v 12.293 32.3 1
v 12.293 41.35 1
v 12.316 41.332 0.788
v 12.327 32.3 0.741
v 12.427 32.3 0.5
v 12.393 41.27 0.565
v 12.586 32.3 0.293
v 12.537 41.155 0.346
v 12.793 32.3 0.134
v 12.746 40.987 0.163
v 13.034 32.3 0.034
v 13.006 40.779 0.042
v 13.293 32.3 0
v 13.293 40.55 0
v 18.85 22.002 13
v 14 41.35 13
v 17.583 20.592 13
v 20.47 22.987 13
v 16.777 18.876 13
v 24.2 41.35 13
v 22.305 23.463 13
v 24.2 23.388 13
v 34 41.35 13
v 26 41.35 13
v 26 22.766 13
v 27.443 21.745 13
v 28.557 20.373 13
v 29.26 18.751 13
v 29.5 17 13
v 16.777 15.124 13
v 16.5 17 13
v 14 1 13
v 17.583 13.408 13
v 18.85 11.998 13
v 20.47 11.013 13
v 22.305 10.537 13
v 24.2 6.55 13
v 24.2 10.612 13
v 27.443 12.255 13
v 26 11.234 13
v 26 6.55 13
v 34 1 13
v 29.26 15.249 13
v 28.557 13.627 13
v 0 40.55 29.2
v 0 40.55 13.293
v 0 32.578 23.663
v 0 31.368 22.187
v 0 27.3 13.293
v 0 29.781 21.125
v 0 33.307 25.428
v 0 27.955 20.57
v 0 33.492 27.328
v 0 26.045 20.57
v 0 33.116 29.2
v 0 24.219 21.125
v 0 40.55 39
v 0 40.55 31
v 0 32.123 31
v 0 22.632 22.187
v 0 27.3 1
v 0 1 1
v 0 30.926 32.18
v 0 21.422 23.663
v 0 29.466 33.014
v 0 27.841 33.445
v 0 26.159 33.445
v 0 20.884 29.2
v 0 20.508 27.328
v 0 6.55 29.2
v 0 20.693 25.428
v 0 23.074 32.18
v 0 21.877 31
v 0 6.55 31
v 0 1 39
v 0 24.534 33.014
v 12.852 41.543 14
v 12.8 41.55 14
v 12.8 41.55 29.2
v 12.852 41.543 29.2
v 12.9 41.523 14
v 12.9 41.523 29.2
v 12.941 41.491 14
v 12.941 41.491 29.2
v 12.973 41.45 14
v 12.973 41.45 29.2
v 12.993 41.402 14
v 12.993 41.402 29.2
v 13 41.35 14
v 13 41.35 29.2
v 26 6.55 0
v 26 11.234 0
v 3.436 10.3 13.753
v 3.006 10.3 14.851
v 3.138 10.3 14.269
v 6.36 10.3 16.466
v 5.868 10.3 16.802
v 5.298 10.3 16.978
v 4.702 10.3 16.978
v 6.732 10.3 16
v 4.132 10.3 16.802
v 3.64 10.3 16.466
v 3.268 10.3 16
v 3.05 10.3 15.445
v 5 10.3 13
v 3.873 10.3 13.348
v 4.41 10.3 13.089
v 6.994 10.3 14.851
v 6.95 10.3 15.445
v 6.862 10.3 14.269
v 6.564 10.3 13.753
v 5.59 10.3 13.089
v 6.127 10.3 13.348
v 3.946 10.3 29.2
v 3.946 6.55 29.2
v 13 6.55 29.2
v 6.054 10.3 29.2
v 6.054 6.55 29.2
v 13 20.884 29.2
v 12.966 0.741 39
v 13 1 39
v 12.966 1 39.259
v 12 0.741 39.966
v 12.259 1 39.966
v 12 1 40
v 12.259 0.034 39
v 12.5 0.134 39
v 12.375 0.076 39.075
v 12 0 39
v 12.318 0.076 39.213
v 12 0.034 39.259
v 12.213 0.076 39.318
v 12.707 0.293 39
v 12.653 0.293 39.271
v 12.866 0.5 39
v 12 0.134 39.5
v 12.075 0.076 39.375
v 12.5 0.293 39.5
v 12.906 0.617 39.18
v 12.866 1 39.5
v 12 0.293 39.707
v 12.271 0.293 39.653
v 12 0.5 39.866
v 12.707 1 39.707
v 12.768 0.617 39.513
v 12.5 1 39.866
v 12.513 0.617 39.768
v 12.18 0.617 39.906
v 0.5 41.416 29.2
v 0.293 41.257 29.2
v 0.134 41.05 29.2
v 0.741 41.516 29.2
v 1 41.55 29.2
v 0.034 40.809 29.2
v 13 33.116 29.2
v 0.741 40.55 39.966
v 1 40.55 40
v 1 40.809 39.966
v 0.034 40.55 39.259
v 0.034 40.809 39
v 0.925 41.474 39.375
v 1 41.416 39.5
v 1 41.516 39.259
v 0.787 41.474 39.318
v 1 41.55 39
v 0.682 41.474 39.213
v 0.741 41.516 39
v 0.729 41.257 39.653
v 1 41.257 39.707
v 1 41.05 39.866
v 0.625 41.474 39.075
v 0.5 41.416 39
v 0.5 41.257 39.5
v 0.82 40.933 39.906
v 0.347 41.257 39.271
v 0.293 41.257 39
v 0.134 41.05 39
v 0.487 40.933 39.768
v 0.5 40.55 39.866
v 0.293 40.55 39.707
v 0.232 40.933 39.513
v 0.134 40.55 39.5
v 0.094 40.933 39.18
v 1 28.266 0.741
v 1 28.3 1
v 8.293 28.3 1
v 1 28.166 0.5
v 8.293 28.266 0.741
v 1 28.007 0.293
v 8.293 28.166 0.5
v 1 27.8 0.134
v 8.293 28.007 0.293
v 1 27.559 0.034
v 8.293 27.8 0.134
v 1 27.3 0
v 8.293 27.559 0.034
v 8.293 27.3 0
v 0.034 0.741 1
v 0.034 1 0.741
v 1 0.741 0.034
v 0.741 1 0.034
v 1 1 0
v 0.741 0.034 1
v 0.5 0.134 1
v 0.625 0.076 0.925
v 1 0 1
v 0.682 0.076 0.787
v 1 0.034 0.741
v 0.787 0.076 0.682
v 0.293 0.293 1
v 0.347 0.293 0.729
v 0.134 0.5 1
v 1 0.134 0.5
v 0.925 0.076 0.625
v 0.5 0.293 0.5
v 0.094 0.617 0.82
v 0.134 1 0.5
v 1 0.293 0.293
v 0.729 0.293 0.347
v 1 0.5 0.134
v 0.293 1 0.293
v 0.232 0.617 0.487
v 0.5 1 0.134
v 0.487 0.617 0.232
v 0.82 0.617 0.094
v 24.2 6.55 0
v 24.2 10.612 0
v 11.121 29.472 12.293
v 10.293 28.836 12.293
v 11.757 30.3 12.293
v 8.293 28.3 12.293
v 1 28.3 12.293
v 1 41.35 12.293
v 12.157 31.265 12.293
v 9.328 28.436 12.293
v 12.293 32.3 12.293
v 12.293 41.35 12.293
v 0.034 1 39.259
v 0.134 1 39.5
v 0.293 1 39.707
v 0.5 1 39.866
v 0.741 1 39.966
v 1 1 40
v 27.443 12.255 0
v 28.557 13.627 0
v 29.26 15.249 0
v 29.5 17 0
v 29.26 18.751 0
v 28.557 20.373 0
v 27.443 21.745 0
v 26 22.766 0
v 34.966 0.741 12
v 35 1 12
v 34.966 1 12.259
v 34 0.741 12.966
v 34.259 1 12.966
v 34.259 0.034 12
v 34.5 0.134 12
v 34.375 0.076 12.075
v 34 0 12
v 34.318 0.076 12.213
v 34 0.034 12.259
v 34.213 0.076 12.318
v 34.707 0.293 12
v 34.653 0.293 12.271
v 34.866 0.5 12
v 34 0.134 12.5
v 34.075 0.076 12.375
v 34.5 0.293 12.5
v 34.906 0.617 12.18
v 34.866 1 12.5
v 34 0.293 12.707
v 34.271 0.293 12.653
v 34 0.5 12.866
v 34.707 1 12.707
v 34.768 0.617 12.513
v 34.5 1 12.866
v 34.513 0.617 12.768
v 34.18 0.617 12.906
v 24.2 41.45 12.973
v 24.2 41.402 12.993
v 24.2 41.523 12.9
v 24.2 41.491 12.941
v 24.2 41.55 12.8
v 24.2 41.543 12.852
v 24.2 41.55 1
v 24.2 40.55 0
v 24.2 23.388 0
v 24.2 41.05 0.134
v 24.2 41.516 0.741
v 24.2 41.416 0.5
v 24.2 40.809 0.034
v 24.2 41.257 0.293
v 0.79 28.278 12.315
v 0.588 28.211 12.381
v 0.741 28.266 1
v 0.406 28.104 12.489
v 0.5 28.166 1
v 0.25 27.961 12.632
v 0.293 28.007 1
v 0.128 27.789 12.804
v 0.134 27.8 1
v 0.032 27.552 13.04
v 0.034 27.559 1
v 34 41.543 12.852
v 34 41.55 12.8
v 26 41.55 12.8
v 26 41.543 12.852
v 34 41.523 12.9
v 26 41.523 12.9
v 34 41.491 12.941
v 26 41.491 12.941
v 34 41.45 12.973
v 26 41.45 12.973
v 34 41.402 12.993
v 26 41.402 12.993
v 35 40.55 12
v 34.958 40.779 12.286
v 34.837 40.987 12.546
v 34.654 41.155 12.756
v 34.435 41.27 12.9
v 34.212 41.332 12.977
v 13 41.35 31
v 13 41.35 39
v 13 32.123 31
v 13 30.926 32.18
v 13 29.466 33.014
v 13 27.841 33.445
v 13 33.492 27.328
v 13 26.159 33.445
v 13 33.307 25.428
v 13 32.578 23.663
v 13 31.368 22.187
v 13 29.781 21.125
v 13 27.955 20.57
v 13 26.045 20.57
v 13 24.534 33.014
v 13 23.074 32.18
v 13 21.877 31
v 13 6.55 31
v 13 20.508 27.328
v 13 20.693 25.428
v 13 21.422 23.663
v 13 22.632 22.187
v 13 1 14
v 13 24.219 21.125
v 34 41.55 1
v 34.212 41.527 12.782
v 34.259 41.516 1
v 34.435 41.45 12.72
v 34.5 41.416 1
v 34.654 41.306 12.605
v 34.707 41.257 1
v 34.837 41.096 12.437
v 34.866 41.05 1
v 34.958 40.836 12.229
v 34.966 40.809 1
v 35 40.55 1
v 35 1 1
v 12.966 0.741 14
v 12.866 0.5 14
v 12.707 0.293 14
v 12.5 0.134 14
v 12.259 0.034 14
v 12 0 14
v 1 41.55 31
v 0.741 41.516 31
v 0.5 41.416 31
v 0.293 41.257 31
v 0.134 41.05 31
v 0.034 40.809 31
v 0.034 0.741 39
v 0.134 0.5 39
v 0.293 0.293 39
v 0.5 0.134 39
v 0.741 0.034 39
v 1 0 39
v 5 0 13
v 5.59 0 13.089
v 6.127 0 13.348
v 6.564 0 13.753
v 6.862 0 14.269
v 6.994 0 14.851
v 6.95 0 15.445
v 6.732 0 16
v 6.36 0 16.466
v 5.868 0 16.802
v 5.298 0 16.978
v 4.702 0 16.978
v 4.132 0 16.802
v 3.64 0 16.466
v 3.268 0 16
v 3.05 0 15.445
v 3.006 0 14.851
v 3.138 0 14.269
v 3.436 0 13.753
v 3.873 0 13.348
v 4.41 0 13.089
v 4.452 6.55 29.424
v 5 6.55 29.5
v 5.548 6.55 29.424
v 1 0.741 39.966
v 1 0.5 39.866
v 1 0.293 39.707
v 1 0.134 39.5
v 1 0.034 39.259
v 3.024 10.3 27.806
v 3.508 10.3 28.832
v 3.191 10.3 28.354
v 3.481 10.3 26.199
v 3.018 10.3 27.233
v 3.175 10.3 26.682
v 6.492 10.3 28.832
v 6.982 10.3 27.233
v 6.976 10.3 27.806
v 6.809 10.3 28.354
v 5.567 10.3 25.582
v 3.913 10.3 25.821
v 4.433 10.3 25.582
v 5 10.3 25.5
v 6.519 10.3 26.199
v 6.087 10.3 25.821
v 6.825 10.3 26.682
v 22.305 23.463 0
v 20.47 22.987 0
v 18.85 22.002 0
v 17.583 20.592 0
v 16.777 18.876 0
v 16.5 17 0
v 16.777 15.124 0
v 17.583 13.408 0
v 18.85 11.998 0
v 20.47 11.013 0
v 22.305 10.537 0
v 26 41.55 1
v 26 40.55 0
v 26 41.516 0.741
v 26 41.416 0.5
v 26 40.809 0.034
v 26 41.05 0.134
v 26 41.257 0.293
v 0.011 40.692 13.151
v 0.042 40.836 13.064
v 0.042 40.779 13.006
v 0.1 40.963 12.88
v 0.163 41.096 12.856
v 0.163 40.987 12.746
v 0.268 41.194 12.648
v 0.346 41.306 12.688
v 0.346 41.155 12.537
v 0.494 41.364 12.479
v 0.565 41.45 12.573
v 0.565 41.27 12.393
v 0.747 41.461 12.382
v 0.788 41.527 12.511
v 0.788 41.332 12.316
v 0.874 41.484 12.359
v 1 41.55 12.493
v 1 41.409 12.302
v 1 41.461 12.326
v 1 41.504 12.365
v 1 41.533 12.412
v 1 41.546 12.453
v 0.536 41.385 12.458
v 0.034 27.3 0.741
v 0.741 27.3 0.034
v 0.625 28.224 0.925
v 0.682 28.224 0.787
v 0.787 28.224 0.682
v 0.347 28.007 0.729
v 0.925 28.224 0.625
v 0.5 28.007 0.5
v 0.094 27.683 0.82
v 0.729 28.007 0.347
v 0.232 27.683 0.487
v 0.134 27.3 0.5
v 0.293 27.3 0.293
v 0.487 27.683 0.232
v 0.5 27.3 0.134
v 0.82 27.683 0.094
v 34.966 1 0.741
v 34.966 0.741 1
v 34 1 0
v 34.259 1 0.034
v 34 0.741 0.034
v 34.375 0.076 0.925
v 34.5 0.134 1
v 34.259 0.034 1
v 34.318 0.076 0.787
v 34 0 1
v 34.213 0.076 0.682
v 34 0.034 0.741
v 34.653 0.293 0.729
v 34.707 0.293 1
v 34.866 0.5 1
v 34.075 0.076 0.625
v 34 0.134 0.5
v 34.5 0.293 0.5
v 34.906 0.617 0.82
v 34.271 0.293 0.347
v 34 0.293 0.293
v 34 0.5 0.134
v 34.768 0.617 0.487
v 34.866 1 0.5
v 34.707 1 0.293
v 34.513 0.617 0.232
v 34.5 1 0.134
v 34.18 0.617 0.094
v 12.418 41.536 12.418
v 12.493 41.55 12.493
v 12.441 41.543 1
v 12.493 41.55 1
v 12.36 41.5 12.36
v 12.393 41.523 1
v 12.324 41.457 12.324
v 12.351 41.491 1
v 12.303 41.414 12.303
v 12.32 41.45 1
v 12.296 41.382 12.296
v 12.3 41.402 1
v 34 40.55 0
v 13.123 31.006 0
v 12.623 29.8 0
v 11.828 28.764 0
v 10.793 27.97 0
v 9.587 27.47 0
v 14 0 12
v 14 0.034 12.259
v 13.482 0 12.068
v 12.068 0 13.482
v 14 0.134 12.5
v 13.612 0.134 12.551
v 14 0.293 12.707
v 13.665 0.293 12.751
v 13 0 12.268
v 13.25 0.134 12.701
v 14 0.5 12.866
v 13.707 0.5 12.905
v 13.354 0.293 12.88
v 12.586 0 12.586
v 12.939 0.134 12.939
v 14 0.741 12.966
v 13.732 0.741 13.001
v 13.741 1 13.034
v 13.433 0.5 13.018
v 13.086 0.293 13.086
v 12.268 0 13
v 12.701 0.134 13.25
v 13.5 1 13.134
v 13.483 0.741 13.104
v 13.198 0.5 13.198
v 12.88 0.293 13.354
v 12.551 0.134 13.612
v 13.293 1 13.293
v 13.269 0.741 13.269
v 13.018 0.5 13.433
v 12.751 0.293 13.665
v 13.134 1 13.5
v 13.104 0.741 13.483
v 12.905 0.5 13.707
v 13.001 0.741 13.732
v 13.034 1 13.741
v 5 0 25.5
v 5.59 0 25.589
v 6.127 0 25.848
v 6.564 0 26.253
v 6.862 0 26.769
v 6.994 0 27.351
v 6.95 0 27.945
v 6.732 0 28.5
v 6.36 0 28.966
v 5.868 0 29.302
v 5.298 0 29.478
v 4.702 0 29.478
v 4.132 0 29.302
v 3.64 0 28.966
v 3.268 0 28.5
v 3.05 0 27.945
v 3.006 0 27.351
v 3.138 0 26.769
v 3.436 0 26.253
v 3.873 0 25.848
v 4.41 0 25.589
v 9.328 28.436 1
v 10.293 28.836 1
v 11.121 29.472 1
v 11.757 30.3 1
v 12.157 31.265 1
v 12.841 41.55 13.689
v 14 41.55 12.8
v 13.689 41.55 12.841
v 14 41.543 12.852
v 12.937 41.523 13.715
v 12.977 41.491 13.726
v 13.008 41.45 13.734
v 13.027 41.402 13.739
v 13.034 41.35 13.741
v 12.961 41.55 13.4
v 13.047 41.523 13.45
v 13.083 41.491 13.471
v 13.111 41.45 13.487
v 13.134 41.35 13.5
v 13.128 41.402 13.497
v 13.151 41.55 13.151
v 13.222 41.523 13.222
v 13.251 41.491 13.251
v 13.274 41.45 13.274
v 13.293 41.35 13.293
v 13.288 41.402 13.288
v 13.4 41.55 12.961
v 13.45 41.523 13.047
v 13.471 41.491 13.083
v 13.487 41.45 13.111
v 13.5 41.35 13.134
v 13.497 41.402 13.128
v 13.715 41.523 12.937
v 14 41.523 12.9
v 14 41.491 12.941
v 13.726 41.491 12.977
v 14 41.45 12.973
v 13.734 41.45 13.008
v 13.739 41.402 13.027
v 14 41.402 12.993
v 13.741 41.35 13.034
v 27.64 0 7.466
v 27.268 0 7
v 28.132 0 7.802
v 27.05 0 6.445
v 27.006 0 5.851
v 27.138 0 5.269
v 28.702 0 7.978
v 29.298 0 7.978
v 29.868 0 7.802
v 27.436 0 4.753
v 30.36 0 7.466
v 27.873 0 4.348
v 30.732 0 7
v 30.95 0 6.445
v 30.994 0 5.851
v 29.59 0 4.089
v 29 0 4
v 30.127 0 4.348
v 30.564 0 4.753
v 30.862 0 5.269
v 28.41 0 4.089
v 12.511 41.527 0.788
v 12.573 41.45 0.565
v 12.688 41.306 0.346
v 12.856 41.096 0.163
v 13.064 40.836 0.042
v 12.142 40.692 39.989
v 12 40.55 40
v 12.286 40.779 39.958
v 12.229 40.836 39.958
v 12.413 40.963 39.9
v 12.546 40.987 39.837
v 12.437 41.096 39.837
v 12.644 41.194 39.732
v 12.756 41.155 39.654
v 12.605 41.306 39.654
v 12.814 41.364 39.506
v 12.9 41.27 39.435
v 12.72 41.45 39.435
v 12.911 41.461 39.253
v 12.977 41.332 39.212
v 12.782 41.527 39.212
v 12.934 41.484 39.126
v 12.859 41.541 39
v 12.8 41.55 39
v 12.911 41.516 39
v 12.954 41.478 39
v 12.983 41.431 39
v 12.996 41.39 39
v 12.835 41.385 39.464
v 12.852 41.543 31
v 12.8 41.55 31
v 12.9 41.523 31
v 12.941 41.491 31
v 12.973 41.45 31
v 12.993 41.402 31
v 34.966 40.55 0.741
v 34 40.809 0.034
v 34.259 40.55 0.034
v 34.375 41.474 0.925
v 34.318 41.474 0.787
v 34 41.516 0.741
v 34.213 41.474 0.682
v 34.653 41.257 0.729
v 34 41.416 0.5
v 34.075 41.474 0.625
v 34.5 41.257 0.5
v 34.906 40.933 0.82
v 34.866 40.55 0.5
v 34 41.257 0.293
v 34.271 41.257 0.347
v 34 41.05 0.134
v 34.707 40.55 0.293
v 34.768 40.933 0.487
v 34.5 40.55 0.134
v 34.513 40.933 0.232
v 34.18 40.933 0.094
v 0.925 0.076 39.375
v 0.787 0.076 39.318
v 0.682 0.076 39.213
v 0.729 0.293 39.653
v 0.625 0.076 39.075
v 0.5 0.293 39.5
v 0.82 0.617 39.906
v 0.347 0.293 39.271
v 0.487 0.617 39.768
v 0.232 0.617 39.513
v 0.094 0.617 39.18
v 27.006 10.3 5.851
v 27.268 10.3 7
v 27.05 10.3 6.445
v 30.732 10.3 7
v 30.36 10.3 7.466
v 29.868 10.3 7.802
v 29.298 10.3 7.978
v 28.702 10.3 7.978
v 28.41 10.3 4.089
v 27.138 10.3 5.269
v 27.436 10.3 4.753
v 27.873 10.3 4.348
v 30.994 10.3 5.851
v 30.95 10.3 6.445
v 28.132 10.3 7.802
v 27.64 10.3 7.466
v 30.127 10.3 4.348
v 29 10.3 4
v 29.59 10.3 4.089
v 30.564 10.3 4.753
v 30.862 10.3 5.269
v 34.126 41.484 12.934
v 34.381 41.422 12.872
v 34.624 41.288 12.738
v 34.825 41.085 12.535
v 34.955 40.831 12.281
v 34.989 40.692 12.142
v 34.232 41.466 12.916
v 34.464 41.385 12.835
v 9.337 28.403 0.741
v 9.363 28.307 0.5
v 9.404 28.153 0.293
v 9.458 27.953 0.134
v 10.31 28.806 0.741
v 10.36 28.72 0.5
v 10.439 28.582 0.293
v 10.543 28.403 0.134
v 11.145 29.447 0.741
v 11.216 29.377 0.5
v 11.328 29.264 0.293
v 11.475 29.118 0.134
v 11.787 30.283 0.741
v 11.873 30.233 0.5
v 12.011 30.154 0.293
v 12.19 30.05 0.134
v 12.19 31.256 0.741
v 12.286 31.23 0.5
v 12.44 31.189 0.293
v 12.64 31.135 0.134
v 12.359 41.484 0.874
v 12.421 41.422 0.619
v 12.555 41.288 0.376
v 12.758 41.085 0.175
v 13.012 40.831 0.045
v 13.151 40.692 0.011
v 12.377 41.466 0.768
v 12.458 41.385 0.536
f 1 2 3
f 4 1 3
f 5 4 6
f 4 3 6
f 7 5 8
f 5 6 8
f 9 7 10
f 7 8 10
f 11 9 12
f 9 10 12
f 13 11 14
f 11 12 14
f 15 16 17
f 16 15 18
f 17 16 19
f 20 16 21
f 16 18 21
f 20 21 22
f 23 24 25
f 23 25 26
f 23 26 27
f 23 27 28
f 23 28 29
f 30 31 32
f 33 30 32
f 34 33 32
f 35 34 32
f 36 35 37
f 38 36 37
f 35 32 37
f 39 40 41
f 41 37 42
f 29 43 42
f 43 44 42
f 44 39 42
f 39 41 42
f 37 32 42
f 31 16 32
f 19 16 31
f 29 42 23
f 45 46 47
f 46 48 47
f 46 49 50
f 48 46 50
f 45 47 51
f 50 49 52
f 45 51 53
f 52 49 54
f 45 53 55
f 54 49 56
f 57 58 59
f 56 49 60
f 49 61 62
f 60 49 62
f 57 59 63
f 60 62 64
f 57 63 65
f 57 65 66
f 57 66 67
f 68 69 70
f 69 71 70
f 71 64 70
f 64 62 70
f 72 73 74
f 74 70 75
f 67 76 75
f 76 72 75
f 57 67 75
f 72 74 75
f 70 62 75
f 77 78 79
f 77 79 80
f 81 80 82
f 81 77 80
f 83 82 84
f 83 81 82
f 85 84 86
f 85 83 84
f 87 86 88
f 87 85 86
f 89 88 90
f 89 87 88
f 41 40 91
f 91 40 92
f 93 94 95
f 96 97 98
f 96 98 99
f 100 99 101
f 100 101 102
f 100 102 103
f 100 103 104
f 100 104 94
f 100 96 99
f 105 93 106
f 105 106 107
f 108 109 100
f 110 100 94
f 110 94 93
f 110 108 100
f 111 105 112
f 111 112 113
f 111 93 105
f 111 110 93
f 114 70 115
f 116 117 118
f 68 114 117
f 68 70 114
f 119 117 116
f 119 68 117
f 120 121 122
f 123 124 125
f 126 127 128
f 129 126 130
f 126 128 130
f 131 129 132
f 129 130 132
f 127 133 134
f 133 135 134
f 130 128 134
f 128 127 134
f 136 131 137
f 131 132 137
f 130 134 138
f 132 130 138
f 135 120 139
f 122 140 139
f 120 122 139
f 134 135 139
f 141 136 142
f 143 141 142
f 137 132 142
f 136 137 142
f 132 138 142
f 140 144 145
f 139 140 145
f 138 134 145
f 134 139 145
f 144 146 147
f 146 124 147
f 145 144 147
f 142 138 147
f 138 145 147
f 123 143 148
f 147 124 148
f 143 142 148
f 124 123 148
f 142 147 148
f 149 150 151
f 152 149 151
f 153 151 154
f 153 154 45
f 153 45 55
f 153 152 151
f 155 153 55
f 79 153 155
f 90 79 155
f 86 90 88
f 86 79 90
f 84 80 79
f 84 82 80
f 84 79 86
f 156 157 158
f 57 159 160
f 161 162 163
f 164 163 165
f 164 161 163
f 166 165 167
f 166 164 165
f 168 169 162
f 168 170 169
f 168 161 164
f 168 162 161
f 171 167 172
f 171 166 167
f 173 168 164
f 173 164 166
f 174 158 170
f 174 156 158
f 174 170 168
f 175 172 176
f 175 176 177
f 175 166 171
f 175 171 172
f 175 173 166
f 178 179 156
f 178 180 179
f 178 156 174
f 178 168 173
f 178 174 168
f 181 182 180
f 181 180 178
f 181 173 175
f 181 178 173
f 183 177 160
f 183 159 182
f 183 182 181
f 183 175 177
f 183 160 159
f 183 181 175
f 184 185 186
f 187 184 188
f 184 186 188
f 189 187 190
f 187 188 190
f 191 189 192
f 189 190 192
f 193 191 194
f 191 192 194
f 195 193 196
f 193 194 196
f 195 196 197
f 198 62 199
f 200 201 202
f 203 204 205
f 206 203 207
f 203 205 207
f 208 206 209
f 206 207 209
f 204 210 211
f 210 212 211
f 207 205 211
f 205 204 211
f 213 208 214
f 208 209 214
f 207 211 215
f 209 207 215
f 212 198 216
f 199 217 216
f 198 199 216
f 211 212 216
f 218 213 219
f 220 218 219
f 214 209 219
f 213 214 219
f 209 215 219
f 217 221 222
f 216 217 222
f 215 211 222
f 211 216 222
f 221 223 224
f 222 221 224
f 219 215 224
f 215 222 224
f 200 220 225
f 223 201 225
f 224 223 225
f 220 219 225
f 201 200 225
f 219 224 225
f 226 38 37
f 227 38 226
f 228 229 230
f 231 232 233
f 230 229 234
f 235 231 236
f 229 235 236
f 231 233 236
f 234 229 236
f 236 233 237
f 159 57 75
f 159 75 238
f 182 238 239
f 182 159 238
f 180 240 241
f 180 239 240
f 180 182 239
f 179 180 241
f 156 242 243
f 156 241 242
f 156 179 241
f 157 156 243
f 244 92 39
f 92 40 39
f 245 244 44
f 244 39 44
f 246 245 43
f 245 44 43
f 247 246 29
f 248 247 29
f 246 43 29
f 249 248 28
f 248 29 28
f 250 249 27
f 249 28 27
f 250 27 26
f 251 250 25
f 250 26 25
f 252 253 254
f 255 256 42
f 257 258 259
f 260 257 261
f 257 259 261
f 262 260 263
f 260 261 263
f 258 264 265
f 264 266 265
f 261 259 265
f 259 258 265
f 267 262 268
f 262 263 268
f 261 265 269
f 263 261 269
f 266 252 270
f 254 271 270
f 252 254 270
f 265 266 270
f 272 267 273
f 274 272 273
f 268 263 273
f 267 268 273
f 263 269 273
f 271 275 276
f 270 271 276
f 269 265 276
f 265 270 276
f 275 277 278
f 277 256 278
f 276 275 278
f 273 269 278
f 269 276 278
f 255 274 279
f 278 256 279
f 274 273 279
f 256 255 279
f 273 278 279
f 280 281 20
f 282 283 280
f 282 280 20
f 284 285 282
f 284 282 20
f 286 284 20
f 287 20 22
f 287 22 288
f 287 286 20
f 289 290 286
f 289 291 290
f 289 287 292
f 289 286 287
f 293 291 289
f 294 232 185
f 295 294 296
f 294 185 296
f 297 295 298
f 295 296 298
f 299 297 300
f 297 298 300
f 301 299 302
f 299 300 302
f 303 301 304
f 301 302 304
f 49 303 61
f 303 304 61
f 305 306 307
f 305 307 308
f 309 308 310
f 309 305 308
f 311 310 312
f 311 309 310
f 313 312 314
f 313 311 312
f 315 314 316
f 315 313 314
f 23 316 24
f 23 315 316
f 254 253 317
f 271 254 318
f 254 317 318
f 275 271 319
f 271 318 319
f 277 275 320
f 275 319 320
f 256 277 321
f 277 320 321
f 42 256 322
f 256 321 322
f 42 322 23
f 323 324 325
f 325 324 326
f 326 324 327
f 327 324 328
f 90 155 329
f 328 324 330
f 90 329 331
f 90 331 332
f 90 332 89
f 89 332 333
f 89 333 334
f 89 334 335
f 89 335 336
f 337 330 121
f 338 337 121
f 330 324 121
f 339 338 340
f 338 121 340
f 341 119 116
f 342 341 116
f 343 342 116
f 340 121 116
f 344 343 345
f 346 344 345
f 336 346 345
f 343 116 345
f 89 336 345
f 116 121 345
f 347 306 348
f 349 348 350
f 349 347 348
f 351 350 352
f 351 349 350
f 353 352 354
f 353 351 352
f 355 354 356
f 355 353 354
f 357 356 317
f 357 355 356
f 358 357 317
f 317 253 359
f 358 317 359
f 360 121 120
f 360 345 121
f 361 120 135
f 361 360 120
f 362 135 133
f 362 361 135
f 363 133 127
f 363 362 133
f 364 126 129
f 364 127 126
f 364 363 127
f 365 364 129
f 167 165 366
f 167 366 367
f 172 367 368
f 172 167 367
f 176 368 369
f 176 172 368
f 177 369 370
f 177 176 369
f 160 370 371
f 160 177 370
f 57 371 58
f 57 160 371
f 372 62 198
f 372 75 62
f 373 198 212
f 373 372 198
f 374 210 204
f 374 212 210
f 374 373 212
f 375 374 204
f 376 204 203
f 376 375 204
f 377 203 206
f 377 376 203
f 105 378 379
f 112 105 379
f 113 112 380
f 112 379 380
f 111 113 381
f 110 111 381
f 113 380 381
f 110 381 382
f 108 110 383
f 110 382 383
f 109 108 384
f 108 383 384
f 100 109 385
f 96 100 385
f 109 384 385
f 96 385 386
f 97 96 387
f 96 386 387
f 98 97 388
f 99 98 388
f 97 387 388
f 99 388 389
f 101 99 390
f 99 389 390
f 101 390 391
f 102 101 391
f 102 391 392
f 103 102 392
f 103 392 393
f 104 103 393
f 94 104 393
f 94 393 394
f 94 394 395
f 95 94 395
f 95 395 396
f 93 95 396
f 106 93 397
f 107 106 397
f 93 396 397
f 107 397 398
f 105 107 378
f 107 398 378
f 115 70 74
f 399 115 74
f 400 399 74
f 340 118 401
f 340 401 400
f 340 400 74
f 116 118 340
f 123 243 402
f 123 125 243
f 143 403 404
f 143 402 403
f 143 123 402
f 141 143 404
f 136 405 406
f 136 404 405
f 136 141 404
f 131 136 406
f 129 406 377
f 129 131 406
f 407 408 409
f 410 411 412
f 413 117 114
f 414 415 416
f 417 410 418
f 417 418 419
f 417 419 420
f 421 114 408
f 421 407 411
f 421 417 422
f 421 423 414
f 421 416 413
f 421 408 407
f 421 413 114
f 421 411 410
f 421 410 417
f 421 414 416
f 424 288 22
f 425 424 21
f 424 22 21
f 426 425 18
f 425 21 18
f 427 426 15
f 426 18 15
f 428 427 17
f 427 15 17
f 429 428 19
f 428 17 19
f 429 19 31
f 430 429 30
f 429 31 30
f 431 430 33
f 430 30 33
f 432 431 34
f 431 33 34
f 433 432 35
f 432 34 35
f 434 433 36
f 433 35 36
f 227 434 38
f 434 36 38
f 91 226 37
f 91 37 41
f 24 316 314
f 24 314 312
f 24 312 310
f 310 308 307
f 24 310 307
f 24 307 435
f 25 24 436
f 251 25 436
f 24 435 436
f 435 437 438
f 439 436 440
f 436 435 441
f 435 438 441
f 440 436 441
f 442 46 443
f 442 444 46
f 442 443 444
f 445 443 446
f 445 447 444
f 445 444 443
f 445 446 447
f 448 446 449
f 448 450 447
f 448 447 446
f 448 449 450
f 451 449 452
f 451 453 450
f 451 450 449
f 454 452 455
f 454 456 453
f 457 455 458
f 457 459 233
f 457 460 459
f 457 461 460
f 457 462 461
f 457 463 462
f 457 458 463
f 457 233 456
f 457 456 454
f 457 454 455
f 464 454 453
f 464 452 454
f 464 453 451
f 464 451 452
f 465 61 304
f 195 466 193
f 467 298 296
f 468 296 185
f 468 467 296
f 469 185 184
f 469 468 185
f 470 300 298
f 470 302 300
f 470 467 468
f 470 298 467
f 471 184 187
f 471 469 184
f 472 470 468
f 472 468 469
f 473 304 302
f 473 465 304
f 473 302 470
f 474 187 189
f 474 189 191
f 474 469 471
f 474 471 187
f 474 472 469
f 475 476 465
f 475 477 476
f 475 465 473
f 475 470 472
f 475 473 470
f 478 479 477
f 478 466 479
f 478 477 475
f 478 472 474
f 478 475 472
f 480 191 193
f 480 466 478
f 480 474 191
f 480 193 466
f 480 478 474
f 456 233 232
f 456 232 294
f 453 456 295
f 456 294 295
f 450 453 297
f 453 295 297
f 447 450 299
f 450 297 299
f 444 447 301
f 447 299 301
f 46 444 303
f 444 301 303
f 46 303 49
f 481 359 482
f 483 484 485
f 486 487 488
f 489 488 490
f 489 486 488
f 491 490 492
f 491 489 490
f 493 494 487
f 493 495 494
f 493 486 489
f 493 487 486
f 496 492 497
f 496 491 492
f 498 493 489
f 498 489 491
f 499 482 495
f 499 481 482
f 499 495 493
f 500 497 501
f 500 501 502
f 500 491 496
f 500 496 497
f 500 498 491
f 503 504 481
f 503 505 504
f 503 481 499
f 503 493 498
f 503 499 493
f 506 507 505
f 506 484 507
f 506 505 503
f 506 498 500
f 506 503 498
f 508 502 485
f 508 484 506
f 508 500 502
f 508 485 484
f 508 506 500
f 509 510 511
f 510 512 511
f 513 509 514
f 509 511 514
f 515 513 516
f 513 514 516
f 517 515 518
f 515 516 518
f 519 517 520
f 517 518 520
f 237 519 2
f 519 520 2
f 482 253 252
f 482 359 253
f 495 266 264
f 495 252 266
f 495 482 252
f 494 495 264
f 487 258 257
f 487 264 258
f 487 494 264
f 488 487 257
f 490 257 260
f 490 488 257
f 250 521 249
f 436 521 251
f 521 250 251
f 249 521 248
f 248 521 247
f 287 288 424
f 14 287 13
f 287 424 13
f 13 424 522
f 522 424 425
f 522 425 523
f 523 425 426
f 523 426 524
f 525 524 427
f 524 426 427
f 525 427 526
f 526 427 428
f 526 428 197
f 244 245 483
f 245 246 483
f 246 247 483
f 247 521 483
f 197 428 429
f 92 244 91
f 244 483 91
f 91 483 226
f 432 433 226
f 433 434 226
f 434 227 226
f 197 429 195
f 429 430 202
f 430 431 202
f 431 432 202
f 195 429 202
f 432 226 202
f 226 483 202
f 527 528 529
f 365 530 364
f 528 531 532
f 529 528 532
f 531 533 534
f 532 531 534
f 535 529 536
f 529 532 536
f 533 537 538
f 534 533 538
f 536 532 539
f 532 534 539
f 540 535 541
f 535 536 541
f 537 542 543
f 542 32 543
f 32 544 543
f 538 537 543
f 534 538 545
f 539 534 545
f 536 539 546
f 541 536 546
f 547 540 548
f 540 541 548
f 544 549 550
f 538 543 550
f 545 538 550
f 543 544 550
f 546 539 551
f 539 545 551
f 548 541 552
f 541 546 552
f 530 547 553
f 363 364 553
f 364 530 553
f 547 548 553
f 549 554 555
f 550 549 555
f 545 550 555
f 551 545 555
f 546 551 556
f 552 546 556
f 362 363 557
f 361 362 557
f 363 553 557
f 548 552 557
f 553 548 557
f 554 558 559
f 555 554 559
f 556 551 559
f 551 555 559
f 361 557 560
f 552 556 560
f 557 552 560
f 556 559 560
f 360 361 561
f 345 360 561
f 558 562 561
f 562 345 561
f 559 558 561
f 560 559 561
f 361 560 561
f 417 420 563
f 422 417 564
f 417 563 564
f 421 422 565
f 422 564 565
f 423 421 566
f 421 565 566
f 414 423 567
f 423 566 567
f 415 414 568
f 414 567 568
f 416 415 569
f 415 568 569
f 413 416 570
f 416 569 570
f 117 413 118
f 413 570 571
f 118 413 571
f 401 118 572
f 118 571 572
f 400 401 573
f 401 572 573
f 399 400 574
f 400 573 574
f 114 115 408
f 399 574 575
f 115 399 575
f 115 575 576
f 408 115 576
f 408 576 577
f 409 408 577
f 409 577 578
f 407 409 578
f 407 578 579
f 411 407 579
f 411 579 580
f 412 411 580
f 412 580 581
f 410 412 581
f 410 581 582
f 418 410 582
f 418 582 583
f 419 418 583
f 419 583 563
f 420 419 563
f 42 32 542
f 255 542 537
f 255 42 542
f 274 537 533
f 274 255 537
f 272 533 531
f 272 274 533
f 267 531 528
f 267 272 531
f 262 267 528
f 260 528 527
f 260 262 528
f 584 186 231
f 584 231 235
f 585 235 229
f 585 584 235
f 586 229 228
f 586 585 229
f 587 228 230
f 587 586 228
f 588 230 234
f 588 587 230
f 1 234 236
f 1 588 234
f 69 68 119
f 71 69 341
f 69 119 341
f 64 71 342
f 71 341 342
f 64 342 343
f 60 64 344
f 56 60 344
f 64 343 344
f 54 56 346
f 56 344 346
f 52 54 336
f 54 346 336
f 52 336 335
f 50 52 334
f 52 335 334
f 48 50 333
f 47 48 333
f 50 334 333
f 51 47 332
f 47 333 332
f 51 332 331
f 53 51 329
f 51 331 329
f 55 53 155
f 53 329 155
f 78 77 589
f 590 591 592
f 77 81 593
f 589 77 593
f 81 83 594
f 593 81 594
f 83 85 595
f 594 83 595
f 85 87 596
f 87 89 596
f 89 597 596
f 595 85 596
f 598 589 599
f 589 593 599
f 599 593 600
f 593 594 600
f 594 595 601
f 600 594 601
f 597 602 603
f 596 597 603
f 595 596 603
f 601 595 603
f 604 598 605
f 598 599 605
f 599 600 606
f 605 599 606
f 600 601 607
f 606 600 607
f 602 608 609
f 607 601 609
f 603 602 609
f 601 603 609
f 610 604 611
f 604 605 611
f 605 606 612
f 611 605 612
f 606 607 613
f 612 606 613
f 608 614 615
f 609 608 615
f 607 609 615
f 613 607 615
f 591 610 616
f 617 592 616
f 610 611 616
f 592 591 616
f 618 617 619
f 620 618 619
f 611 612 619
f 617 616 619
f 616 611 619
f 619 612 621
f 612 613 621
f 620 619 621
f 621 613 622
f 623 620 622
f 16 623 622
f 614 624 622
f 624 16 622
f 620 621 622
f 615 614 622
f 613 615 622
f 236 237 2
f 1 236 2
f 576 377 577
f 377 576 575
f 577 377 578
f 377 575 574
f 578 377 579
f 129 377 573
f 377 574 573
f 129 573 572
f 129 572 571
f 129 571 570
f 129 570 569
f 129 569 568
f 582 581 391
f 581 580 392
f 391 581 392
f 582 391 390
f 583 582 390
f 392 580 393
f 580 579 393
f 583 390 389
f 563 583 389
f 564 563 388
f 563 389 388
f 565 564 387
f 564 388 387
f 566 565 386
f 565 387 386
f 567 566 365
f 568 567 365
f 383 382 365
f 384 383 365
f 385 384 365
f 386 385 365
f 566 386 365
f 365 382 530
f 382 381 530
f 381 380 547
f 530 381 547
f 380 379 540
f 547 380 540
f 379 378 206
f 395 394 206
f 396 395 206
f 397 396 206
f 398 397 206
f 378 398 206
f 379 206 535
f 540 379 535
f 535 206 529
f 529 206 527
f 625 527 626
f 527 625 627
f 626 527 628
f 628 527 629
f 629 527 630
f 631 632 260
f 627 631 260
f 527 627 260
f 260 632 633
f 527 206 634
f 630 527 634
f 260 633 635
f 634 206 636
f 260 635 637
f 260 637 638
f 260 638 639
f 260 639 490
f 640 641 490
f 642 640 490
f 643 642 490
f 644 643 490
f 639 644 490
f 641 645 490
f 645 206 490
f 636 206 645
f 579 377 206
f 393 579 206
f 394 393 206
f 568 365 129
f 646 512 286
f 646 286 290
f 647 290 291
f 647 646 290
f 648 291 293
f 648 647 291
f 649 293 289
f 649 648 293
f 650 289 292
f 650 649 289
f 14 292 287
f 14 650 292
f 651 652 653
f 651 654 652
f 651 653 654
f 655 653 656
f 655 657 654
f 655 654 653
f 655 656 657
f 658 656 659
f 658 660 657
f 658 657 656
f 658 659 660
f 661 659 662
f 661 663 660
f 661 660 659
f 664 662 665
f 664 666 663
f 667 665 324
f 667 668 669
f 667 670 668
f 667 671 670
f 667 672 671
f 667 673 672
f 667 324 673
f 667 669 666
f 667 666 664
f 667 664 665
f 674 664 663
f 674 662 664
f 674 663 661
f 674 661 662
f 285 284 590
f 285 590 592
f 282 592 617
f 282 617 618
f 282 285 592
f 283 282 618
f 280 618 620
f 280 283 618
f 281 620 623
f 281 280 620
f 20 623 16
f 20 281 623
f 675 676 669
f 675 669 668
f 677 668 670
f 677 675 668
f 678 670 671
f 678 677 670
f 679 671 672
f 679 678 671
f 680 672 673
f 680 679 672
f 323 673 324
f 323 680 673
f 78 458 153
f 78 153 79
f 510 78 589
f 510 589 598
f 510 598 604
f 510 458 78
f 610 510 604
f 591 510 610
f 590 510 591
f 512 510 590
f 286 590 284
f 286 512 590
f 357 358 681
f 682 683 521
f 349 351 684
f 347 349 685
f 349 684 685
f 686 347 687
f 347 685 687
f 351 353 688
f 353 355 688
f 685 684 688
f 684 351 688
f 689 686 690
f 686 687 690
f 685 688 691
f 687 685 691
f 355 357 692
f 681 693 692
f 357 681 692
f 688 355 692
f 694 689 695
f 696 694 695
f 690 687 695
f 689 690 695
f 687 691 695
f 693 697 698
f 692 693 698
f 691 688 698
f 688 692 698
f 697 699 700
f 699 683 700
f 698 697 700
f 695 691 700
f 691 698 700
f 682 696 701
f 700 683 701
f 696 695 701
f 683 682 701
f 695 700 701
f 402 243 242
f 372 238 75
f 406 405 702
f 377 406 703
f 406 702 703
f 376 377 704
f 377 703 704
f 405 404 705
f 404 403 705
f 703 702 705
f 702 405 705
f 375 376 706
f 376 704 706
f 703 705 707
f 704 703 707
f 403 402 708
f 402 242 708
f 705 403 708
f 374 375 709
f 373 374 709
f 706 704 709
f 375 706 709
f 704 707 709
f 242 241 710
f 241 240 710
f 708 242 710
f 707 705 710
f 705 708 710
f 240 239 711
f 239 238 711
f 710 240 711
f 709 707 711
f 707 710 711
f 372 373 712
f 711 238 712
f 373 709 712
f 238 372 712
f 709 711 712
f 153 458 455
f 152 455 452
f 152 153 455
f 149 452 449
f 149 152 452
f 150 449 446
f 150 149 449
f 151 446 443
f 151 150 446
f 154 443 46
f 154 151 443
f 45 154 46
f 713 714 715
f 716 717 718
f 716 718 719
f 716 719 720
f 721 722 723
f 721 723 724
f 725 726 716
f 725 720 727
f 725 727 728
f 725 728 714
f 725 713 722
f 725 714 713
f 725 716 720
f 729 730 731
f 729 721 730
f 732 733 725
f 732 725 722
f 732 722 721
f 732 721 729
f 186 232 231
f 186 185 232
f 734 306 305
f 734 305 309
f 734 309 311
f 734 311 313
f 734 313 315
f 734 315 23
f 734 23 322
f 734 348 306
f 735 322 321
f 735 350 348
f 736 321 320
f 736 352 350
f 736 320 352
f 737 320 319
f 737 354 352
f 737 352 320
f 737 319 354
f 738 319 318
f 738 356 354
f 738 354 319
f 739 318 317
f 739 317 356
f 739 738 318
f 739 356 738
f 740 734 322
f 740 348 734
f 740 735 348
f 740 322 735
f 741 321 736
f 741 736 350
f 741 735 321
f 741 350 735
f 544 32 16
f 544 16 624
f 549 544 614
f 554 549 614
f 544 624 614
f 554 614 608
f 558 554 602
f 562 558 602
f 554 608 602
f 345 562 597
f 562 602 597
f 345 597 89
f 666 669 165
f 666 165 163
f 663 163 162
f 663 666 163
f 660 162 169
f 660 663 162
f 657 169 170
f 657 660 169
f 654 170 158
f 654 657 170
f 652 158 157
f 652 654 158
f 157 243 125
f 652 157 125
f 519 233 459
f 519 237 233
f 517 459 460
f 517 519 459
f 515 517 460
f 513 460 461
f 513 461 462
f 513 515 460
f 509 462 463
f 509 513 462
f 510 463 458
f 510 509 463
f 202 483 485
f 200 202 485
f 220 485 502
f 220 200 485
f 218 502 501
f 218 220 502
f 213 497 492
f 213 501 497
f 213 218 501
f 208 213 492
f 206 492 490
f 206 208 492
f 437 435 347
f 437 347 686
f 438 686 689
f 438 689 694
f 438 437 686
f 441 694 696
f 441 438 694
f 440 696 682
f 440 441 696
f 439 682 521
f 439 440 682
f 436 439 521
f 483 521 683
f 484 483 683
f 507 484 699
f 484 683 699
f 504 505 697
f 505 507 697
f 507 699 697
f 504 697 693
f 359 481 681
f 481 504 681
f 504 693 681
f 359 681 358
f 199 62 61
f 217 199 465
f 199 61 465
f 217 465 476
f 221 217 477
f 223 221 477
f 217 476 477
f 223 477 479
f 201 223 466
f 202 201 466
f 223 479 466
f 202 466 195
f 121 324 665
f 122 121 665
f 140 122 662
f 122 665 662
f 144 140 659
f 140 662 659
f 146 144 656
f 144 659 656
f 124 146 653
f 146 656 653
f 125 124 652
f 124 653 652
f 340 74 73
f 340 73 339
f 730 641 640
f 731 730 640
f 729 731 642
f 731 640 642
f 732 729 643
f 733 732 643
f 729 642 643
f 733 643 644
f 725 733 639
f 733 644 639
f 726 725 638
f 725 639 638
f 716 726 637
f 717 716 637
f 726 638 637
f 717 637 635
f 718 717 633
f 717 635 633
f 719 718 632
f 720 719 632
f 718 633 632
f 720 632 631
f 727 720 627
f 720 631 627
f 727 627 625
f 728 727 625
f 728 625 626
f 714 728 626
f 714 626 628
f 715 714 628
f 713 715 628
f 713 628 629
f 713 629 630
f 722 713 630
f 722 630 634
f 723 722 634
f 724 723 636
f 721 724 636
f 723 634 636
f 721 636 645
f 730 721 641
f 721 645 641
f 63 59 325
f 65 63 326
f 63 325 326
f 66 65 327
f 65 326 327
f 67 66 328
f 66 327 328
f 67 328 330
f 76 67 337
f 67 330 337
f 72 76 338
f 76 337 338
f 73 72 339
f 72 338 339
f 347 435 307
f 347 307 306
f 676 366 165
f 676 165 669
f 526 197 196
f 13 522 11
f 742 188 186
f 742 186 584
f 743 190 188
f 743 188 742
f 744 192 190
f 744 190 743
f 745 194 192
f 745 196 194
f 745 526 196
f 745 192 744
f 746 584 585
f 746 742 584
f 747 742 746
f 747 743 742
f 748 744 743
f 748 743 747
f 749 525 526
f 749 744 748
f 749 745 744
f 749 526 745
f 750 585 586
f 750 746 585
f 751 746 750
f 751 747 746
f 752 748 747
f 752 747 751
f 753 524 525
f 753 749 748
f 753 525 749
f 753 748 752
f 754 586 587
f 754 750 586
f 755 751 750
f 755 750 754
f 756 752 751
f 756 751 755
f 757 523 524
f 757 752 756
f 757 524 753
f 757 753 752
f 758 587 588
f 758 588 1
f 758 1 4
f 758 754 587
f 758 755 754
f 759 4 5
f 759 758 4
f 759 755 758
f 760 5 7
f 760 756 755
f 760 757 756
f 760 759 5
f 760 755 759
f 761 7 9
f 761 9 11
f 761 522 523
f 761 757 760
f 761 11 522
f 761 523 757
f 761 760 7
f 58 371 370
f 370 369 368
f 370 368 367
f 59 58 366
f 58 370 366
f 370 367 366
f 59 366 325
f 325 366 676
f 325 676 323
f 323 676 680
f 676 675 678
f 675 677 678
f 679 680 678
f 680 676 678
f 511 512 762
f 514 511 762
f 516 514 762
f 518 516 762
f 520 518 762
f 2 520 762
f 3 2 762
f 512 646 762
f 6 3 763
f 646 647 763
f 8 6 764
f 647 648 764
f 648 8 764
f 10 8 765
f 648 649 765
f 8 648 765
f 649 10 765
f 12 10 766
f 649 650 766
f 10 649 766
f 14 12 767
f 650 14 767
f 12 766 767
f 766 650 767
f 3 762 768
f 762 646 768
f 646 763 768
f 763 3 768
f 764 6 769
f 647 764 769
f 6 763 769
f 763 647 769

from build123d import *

# Parameters (mm, degrees)
BOSS_EXTRUDE1_DEPTH = 41.55
SKETCH2_W           = 12.292893219
SKETCH2_H           = 12.292893219
CUT_EXTRUDE1_DEPTH  = 13.25
FILLET1_R           = 4
FILLET2_R           = 1
FILLET3_R           = 0.2
SKETCH3_W           = 13
SKETCH3_H           = 1.8
SKETCH3_W_2         = 1.8
SKETCH3_H_2         = 13
CUT_EXTRUDE2_DEPTH  = 35
SKETCH4_R           = 6.5
CUT_EXTRUDE3_DEPTH  = 35
SKETCH5_R           = 6.5
CUT_EXTRUDE4_DEPTH  = 35
SKETCH6_R           = 2
CUT_EXTRUDE5_DEPTH  = 10.3


with BuildPart() as part:
    # Sketch1 → Boss-Extrude1 (new body)
    with BuildSketch(Plane(origin=(0, 0, 0), x_dir=(1, 0, 0), z_dir=(0, 1, 0))):
        Polygon((0, 0), (0, -40), (13, -40), (13, -13), (35, -13), (35, 0), align=None)
    extrude(amount=BOSS_EXTRUDE1_DEPTH)

    # Sketch2 → Cut-Extrude1 (cut)
    with BuildSketch(Plane(origin=(0, 41.55, 0), x_dir=(1, 0, 0), z_dir=(0, 1, 0))):
        with Locations((6.14644661, -6.14644661)):
            Rectangle(SKETCH2_W, SKETCH2_H)
    extrude(amount=-CUT_EXTRUDE1_DEPTH, mode=Mode.SUBTRACT)

    # Fillet1
    fillet1_edges = [part.edges().sort_by_distance(p)[0] for p in [
        (12.292893219, 28.3, 6.146446609),
    ]]
    fillet(fillet1_edges, radius=FILLET1_R)

    # Fillet2
    fillet2_edges = [part.edges().sort_by_distance(p)[0] for p in [
        (23.646446609, 41.55, 0),
        (12.292893219, 36.925, 0),
        (11.121320344, 29.471572875, 0),
        (4.146446609, 28.3, 0),
        (0, 14.15, 0),
        (0, 28.3, 6.146446609),
        (0, 34.925, 12.292893219),
        (0, 41.55, 26.146446609),
        (0, 0, 20),
        (17.5, 0, 0),
        (35, 41.55, 6.5),
        (35, 20.775, 0),
        (35, 0, 6.5),
        (13, 0, 26.5),
        (13, 20.775, 13),
        (35, 20.775, 13),
        (24, 0, 13),
        (0, 20.775, 40),
        (6.5, 41.55, 40),
        (13, 20.775, 40),
        (6.5, 0, 40),
    ]]
    fillet(fillet2_edges, radius=FILLET2_R)

    # Fillet3
    fillet3_edges = [part.edges().sort_by_distance(p)[0] for p in [
        (0.236703983, 41.196048907, 12.646844311),
        (12.646844311, 41.196048907, 0.236703983),
        (6.646446609, 41.55, 12.292893219),
        (12.292893219, 41.55, 6.646446609),
        (12.646048907, 41.196048907, 39.763296017),
        (34.763296017, 41.196048907, 12.646048907),
        (24, 41.55, 13),
        (13.292893219, 41.55, 13.292893219),
        (13, 41.55, 26.5),
    ]]
    fillet(fillet3_edges, radius=FILLET3_R)

    # Sketch3 → Cut-Extrude2 (cut)
    with BuildSketch(Plane(origin=(0, 41.55, 0), x_dir=(1, 0, 0), z_dir=(0, 1, 0))):
        with Locations((6.5, -30.1)):
            Rectangle(SKETCH3_W, SKETCH3_H)
        with Locations((25.1, -6.5)):
            Rectangle(SKETCH3_W_2, SKETCH3_H_2)
    extrude(amount=-CUT_EXTRUDE2_DEPTH, mode=Mode.SUBTRACT)

    # Sketch4 → Cut-Extrude3 (cut)
    with BuildSketch(Plane.XY.offset(13)):
        with Locations((23, 17)):
            Circle(SKETCH4_R)
    extrude(amount=-CUT_EXTRUDE3_DEPTH, mode=Mode.SUBTRACT)

    # Sketch5 → Cut-Extrude4 (cut)
    with BuildSketch(Plane(origin=(13, 0, 0), x_dir=(0, 0, -1), z_dir=(1, 0, 0))):
        with Locations((-27, 27)):
            Circle(SKETCH5_R)
    extrude(amount=-CUT_EXTRUDE4_DEPTH, mode=Mode.SUBTRACT)

    # Sketch6 → Cut-Extrude5 (cut)
    with BuildSketch(Plane.XZ):
        with Locations((5, 27.5)):
            Circle(SKETCH6_R)
        with Locations((5, 15)):
            Circle(SKETCH6_R)
        with Locations((29, 6)):
            Circle(SKETCH6_R)
    extrude(amount=-CUT_EXTRUDE5_DEPTH, mode=Mode.SUBTRACT)


solid = part.part
